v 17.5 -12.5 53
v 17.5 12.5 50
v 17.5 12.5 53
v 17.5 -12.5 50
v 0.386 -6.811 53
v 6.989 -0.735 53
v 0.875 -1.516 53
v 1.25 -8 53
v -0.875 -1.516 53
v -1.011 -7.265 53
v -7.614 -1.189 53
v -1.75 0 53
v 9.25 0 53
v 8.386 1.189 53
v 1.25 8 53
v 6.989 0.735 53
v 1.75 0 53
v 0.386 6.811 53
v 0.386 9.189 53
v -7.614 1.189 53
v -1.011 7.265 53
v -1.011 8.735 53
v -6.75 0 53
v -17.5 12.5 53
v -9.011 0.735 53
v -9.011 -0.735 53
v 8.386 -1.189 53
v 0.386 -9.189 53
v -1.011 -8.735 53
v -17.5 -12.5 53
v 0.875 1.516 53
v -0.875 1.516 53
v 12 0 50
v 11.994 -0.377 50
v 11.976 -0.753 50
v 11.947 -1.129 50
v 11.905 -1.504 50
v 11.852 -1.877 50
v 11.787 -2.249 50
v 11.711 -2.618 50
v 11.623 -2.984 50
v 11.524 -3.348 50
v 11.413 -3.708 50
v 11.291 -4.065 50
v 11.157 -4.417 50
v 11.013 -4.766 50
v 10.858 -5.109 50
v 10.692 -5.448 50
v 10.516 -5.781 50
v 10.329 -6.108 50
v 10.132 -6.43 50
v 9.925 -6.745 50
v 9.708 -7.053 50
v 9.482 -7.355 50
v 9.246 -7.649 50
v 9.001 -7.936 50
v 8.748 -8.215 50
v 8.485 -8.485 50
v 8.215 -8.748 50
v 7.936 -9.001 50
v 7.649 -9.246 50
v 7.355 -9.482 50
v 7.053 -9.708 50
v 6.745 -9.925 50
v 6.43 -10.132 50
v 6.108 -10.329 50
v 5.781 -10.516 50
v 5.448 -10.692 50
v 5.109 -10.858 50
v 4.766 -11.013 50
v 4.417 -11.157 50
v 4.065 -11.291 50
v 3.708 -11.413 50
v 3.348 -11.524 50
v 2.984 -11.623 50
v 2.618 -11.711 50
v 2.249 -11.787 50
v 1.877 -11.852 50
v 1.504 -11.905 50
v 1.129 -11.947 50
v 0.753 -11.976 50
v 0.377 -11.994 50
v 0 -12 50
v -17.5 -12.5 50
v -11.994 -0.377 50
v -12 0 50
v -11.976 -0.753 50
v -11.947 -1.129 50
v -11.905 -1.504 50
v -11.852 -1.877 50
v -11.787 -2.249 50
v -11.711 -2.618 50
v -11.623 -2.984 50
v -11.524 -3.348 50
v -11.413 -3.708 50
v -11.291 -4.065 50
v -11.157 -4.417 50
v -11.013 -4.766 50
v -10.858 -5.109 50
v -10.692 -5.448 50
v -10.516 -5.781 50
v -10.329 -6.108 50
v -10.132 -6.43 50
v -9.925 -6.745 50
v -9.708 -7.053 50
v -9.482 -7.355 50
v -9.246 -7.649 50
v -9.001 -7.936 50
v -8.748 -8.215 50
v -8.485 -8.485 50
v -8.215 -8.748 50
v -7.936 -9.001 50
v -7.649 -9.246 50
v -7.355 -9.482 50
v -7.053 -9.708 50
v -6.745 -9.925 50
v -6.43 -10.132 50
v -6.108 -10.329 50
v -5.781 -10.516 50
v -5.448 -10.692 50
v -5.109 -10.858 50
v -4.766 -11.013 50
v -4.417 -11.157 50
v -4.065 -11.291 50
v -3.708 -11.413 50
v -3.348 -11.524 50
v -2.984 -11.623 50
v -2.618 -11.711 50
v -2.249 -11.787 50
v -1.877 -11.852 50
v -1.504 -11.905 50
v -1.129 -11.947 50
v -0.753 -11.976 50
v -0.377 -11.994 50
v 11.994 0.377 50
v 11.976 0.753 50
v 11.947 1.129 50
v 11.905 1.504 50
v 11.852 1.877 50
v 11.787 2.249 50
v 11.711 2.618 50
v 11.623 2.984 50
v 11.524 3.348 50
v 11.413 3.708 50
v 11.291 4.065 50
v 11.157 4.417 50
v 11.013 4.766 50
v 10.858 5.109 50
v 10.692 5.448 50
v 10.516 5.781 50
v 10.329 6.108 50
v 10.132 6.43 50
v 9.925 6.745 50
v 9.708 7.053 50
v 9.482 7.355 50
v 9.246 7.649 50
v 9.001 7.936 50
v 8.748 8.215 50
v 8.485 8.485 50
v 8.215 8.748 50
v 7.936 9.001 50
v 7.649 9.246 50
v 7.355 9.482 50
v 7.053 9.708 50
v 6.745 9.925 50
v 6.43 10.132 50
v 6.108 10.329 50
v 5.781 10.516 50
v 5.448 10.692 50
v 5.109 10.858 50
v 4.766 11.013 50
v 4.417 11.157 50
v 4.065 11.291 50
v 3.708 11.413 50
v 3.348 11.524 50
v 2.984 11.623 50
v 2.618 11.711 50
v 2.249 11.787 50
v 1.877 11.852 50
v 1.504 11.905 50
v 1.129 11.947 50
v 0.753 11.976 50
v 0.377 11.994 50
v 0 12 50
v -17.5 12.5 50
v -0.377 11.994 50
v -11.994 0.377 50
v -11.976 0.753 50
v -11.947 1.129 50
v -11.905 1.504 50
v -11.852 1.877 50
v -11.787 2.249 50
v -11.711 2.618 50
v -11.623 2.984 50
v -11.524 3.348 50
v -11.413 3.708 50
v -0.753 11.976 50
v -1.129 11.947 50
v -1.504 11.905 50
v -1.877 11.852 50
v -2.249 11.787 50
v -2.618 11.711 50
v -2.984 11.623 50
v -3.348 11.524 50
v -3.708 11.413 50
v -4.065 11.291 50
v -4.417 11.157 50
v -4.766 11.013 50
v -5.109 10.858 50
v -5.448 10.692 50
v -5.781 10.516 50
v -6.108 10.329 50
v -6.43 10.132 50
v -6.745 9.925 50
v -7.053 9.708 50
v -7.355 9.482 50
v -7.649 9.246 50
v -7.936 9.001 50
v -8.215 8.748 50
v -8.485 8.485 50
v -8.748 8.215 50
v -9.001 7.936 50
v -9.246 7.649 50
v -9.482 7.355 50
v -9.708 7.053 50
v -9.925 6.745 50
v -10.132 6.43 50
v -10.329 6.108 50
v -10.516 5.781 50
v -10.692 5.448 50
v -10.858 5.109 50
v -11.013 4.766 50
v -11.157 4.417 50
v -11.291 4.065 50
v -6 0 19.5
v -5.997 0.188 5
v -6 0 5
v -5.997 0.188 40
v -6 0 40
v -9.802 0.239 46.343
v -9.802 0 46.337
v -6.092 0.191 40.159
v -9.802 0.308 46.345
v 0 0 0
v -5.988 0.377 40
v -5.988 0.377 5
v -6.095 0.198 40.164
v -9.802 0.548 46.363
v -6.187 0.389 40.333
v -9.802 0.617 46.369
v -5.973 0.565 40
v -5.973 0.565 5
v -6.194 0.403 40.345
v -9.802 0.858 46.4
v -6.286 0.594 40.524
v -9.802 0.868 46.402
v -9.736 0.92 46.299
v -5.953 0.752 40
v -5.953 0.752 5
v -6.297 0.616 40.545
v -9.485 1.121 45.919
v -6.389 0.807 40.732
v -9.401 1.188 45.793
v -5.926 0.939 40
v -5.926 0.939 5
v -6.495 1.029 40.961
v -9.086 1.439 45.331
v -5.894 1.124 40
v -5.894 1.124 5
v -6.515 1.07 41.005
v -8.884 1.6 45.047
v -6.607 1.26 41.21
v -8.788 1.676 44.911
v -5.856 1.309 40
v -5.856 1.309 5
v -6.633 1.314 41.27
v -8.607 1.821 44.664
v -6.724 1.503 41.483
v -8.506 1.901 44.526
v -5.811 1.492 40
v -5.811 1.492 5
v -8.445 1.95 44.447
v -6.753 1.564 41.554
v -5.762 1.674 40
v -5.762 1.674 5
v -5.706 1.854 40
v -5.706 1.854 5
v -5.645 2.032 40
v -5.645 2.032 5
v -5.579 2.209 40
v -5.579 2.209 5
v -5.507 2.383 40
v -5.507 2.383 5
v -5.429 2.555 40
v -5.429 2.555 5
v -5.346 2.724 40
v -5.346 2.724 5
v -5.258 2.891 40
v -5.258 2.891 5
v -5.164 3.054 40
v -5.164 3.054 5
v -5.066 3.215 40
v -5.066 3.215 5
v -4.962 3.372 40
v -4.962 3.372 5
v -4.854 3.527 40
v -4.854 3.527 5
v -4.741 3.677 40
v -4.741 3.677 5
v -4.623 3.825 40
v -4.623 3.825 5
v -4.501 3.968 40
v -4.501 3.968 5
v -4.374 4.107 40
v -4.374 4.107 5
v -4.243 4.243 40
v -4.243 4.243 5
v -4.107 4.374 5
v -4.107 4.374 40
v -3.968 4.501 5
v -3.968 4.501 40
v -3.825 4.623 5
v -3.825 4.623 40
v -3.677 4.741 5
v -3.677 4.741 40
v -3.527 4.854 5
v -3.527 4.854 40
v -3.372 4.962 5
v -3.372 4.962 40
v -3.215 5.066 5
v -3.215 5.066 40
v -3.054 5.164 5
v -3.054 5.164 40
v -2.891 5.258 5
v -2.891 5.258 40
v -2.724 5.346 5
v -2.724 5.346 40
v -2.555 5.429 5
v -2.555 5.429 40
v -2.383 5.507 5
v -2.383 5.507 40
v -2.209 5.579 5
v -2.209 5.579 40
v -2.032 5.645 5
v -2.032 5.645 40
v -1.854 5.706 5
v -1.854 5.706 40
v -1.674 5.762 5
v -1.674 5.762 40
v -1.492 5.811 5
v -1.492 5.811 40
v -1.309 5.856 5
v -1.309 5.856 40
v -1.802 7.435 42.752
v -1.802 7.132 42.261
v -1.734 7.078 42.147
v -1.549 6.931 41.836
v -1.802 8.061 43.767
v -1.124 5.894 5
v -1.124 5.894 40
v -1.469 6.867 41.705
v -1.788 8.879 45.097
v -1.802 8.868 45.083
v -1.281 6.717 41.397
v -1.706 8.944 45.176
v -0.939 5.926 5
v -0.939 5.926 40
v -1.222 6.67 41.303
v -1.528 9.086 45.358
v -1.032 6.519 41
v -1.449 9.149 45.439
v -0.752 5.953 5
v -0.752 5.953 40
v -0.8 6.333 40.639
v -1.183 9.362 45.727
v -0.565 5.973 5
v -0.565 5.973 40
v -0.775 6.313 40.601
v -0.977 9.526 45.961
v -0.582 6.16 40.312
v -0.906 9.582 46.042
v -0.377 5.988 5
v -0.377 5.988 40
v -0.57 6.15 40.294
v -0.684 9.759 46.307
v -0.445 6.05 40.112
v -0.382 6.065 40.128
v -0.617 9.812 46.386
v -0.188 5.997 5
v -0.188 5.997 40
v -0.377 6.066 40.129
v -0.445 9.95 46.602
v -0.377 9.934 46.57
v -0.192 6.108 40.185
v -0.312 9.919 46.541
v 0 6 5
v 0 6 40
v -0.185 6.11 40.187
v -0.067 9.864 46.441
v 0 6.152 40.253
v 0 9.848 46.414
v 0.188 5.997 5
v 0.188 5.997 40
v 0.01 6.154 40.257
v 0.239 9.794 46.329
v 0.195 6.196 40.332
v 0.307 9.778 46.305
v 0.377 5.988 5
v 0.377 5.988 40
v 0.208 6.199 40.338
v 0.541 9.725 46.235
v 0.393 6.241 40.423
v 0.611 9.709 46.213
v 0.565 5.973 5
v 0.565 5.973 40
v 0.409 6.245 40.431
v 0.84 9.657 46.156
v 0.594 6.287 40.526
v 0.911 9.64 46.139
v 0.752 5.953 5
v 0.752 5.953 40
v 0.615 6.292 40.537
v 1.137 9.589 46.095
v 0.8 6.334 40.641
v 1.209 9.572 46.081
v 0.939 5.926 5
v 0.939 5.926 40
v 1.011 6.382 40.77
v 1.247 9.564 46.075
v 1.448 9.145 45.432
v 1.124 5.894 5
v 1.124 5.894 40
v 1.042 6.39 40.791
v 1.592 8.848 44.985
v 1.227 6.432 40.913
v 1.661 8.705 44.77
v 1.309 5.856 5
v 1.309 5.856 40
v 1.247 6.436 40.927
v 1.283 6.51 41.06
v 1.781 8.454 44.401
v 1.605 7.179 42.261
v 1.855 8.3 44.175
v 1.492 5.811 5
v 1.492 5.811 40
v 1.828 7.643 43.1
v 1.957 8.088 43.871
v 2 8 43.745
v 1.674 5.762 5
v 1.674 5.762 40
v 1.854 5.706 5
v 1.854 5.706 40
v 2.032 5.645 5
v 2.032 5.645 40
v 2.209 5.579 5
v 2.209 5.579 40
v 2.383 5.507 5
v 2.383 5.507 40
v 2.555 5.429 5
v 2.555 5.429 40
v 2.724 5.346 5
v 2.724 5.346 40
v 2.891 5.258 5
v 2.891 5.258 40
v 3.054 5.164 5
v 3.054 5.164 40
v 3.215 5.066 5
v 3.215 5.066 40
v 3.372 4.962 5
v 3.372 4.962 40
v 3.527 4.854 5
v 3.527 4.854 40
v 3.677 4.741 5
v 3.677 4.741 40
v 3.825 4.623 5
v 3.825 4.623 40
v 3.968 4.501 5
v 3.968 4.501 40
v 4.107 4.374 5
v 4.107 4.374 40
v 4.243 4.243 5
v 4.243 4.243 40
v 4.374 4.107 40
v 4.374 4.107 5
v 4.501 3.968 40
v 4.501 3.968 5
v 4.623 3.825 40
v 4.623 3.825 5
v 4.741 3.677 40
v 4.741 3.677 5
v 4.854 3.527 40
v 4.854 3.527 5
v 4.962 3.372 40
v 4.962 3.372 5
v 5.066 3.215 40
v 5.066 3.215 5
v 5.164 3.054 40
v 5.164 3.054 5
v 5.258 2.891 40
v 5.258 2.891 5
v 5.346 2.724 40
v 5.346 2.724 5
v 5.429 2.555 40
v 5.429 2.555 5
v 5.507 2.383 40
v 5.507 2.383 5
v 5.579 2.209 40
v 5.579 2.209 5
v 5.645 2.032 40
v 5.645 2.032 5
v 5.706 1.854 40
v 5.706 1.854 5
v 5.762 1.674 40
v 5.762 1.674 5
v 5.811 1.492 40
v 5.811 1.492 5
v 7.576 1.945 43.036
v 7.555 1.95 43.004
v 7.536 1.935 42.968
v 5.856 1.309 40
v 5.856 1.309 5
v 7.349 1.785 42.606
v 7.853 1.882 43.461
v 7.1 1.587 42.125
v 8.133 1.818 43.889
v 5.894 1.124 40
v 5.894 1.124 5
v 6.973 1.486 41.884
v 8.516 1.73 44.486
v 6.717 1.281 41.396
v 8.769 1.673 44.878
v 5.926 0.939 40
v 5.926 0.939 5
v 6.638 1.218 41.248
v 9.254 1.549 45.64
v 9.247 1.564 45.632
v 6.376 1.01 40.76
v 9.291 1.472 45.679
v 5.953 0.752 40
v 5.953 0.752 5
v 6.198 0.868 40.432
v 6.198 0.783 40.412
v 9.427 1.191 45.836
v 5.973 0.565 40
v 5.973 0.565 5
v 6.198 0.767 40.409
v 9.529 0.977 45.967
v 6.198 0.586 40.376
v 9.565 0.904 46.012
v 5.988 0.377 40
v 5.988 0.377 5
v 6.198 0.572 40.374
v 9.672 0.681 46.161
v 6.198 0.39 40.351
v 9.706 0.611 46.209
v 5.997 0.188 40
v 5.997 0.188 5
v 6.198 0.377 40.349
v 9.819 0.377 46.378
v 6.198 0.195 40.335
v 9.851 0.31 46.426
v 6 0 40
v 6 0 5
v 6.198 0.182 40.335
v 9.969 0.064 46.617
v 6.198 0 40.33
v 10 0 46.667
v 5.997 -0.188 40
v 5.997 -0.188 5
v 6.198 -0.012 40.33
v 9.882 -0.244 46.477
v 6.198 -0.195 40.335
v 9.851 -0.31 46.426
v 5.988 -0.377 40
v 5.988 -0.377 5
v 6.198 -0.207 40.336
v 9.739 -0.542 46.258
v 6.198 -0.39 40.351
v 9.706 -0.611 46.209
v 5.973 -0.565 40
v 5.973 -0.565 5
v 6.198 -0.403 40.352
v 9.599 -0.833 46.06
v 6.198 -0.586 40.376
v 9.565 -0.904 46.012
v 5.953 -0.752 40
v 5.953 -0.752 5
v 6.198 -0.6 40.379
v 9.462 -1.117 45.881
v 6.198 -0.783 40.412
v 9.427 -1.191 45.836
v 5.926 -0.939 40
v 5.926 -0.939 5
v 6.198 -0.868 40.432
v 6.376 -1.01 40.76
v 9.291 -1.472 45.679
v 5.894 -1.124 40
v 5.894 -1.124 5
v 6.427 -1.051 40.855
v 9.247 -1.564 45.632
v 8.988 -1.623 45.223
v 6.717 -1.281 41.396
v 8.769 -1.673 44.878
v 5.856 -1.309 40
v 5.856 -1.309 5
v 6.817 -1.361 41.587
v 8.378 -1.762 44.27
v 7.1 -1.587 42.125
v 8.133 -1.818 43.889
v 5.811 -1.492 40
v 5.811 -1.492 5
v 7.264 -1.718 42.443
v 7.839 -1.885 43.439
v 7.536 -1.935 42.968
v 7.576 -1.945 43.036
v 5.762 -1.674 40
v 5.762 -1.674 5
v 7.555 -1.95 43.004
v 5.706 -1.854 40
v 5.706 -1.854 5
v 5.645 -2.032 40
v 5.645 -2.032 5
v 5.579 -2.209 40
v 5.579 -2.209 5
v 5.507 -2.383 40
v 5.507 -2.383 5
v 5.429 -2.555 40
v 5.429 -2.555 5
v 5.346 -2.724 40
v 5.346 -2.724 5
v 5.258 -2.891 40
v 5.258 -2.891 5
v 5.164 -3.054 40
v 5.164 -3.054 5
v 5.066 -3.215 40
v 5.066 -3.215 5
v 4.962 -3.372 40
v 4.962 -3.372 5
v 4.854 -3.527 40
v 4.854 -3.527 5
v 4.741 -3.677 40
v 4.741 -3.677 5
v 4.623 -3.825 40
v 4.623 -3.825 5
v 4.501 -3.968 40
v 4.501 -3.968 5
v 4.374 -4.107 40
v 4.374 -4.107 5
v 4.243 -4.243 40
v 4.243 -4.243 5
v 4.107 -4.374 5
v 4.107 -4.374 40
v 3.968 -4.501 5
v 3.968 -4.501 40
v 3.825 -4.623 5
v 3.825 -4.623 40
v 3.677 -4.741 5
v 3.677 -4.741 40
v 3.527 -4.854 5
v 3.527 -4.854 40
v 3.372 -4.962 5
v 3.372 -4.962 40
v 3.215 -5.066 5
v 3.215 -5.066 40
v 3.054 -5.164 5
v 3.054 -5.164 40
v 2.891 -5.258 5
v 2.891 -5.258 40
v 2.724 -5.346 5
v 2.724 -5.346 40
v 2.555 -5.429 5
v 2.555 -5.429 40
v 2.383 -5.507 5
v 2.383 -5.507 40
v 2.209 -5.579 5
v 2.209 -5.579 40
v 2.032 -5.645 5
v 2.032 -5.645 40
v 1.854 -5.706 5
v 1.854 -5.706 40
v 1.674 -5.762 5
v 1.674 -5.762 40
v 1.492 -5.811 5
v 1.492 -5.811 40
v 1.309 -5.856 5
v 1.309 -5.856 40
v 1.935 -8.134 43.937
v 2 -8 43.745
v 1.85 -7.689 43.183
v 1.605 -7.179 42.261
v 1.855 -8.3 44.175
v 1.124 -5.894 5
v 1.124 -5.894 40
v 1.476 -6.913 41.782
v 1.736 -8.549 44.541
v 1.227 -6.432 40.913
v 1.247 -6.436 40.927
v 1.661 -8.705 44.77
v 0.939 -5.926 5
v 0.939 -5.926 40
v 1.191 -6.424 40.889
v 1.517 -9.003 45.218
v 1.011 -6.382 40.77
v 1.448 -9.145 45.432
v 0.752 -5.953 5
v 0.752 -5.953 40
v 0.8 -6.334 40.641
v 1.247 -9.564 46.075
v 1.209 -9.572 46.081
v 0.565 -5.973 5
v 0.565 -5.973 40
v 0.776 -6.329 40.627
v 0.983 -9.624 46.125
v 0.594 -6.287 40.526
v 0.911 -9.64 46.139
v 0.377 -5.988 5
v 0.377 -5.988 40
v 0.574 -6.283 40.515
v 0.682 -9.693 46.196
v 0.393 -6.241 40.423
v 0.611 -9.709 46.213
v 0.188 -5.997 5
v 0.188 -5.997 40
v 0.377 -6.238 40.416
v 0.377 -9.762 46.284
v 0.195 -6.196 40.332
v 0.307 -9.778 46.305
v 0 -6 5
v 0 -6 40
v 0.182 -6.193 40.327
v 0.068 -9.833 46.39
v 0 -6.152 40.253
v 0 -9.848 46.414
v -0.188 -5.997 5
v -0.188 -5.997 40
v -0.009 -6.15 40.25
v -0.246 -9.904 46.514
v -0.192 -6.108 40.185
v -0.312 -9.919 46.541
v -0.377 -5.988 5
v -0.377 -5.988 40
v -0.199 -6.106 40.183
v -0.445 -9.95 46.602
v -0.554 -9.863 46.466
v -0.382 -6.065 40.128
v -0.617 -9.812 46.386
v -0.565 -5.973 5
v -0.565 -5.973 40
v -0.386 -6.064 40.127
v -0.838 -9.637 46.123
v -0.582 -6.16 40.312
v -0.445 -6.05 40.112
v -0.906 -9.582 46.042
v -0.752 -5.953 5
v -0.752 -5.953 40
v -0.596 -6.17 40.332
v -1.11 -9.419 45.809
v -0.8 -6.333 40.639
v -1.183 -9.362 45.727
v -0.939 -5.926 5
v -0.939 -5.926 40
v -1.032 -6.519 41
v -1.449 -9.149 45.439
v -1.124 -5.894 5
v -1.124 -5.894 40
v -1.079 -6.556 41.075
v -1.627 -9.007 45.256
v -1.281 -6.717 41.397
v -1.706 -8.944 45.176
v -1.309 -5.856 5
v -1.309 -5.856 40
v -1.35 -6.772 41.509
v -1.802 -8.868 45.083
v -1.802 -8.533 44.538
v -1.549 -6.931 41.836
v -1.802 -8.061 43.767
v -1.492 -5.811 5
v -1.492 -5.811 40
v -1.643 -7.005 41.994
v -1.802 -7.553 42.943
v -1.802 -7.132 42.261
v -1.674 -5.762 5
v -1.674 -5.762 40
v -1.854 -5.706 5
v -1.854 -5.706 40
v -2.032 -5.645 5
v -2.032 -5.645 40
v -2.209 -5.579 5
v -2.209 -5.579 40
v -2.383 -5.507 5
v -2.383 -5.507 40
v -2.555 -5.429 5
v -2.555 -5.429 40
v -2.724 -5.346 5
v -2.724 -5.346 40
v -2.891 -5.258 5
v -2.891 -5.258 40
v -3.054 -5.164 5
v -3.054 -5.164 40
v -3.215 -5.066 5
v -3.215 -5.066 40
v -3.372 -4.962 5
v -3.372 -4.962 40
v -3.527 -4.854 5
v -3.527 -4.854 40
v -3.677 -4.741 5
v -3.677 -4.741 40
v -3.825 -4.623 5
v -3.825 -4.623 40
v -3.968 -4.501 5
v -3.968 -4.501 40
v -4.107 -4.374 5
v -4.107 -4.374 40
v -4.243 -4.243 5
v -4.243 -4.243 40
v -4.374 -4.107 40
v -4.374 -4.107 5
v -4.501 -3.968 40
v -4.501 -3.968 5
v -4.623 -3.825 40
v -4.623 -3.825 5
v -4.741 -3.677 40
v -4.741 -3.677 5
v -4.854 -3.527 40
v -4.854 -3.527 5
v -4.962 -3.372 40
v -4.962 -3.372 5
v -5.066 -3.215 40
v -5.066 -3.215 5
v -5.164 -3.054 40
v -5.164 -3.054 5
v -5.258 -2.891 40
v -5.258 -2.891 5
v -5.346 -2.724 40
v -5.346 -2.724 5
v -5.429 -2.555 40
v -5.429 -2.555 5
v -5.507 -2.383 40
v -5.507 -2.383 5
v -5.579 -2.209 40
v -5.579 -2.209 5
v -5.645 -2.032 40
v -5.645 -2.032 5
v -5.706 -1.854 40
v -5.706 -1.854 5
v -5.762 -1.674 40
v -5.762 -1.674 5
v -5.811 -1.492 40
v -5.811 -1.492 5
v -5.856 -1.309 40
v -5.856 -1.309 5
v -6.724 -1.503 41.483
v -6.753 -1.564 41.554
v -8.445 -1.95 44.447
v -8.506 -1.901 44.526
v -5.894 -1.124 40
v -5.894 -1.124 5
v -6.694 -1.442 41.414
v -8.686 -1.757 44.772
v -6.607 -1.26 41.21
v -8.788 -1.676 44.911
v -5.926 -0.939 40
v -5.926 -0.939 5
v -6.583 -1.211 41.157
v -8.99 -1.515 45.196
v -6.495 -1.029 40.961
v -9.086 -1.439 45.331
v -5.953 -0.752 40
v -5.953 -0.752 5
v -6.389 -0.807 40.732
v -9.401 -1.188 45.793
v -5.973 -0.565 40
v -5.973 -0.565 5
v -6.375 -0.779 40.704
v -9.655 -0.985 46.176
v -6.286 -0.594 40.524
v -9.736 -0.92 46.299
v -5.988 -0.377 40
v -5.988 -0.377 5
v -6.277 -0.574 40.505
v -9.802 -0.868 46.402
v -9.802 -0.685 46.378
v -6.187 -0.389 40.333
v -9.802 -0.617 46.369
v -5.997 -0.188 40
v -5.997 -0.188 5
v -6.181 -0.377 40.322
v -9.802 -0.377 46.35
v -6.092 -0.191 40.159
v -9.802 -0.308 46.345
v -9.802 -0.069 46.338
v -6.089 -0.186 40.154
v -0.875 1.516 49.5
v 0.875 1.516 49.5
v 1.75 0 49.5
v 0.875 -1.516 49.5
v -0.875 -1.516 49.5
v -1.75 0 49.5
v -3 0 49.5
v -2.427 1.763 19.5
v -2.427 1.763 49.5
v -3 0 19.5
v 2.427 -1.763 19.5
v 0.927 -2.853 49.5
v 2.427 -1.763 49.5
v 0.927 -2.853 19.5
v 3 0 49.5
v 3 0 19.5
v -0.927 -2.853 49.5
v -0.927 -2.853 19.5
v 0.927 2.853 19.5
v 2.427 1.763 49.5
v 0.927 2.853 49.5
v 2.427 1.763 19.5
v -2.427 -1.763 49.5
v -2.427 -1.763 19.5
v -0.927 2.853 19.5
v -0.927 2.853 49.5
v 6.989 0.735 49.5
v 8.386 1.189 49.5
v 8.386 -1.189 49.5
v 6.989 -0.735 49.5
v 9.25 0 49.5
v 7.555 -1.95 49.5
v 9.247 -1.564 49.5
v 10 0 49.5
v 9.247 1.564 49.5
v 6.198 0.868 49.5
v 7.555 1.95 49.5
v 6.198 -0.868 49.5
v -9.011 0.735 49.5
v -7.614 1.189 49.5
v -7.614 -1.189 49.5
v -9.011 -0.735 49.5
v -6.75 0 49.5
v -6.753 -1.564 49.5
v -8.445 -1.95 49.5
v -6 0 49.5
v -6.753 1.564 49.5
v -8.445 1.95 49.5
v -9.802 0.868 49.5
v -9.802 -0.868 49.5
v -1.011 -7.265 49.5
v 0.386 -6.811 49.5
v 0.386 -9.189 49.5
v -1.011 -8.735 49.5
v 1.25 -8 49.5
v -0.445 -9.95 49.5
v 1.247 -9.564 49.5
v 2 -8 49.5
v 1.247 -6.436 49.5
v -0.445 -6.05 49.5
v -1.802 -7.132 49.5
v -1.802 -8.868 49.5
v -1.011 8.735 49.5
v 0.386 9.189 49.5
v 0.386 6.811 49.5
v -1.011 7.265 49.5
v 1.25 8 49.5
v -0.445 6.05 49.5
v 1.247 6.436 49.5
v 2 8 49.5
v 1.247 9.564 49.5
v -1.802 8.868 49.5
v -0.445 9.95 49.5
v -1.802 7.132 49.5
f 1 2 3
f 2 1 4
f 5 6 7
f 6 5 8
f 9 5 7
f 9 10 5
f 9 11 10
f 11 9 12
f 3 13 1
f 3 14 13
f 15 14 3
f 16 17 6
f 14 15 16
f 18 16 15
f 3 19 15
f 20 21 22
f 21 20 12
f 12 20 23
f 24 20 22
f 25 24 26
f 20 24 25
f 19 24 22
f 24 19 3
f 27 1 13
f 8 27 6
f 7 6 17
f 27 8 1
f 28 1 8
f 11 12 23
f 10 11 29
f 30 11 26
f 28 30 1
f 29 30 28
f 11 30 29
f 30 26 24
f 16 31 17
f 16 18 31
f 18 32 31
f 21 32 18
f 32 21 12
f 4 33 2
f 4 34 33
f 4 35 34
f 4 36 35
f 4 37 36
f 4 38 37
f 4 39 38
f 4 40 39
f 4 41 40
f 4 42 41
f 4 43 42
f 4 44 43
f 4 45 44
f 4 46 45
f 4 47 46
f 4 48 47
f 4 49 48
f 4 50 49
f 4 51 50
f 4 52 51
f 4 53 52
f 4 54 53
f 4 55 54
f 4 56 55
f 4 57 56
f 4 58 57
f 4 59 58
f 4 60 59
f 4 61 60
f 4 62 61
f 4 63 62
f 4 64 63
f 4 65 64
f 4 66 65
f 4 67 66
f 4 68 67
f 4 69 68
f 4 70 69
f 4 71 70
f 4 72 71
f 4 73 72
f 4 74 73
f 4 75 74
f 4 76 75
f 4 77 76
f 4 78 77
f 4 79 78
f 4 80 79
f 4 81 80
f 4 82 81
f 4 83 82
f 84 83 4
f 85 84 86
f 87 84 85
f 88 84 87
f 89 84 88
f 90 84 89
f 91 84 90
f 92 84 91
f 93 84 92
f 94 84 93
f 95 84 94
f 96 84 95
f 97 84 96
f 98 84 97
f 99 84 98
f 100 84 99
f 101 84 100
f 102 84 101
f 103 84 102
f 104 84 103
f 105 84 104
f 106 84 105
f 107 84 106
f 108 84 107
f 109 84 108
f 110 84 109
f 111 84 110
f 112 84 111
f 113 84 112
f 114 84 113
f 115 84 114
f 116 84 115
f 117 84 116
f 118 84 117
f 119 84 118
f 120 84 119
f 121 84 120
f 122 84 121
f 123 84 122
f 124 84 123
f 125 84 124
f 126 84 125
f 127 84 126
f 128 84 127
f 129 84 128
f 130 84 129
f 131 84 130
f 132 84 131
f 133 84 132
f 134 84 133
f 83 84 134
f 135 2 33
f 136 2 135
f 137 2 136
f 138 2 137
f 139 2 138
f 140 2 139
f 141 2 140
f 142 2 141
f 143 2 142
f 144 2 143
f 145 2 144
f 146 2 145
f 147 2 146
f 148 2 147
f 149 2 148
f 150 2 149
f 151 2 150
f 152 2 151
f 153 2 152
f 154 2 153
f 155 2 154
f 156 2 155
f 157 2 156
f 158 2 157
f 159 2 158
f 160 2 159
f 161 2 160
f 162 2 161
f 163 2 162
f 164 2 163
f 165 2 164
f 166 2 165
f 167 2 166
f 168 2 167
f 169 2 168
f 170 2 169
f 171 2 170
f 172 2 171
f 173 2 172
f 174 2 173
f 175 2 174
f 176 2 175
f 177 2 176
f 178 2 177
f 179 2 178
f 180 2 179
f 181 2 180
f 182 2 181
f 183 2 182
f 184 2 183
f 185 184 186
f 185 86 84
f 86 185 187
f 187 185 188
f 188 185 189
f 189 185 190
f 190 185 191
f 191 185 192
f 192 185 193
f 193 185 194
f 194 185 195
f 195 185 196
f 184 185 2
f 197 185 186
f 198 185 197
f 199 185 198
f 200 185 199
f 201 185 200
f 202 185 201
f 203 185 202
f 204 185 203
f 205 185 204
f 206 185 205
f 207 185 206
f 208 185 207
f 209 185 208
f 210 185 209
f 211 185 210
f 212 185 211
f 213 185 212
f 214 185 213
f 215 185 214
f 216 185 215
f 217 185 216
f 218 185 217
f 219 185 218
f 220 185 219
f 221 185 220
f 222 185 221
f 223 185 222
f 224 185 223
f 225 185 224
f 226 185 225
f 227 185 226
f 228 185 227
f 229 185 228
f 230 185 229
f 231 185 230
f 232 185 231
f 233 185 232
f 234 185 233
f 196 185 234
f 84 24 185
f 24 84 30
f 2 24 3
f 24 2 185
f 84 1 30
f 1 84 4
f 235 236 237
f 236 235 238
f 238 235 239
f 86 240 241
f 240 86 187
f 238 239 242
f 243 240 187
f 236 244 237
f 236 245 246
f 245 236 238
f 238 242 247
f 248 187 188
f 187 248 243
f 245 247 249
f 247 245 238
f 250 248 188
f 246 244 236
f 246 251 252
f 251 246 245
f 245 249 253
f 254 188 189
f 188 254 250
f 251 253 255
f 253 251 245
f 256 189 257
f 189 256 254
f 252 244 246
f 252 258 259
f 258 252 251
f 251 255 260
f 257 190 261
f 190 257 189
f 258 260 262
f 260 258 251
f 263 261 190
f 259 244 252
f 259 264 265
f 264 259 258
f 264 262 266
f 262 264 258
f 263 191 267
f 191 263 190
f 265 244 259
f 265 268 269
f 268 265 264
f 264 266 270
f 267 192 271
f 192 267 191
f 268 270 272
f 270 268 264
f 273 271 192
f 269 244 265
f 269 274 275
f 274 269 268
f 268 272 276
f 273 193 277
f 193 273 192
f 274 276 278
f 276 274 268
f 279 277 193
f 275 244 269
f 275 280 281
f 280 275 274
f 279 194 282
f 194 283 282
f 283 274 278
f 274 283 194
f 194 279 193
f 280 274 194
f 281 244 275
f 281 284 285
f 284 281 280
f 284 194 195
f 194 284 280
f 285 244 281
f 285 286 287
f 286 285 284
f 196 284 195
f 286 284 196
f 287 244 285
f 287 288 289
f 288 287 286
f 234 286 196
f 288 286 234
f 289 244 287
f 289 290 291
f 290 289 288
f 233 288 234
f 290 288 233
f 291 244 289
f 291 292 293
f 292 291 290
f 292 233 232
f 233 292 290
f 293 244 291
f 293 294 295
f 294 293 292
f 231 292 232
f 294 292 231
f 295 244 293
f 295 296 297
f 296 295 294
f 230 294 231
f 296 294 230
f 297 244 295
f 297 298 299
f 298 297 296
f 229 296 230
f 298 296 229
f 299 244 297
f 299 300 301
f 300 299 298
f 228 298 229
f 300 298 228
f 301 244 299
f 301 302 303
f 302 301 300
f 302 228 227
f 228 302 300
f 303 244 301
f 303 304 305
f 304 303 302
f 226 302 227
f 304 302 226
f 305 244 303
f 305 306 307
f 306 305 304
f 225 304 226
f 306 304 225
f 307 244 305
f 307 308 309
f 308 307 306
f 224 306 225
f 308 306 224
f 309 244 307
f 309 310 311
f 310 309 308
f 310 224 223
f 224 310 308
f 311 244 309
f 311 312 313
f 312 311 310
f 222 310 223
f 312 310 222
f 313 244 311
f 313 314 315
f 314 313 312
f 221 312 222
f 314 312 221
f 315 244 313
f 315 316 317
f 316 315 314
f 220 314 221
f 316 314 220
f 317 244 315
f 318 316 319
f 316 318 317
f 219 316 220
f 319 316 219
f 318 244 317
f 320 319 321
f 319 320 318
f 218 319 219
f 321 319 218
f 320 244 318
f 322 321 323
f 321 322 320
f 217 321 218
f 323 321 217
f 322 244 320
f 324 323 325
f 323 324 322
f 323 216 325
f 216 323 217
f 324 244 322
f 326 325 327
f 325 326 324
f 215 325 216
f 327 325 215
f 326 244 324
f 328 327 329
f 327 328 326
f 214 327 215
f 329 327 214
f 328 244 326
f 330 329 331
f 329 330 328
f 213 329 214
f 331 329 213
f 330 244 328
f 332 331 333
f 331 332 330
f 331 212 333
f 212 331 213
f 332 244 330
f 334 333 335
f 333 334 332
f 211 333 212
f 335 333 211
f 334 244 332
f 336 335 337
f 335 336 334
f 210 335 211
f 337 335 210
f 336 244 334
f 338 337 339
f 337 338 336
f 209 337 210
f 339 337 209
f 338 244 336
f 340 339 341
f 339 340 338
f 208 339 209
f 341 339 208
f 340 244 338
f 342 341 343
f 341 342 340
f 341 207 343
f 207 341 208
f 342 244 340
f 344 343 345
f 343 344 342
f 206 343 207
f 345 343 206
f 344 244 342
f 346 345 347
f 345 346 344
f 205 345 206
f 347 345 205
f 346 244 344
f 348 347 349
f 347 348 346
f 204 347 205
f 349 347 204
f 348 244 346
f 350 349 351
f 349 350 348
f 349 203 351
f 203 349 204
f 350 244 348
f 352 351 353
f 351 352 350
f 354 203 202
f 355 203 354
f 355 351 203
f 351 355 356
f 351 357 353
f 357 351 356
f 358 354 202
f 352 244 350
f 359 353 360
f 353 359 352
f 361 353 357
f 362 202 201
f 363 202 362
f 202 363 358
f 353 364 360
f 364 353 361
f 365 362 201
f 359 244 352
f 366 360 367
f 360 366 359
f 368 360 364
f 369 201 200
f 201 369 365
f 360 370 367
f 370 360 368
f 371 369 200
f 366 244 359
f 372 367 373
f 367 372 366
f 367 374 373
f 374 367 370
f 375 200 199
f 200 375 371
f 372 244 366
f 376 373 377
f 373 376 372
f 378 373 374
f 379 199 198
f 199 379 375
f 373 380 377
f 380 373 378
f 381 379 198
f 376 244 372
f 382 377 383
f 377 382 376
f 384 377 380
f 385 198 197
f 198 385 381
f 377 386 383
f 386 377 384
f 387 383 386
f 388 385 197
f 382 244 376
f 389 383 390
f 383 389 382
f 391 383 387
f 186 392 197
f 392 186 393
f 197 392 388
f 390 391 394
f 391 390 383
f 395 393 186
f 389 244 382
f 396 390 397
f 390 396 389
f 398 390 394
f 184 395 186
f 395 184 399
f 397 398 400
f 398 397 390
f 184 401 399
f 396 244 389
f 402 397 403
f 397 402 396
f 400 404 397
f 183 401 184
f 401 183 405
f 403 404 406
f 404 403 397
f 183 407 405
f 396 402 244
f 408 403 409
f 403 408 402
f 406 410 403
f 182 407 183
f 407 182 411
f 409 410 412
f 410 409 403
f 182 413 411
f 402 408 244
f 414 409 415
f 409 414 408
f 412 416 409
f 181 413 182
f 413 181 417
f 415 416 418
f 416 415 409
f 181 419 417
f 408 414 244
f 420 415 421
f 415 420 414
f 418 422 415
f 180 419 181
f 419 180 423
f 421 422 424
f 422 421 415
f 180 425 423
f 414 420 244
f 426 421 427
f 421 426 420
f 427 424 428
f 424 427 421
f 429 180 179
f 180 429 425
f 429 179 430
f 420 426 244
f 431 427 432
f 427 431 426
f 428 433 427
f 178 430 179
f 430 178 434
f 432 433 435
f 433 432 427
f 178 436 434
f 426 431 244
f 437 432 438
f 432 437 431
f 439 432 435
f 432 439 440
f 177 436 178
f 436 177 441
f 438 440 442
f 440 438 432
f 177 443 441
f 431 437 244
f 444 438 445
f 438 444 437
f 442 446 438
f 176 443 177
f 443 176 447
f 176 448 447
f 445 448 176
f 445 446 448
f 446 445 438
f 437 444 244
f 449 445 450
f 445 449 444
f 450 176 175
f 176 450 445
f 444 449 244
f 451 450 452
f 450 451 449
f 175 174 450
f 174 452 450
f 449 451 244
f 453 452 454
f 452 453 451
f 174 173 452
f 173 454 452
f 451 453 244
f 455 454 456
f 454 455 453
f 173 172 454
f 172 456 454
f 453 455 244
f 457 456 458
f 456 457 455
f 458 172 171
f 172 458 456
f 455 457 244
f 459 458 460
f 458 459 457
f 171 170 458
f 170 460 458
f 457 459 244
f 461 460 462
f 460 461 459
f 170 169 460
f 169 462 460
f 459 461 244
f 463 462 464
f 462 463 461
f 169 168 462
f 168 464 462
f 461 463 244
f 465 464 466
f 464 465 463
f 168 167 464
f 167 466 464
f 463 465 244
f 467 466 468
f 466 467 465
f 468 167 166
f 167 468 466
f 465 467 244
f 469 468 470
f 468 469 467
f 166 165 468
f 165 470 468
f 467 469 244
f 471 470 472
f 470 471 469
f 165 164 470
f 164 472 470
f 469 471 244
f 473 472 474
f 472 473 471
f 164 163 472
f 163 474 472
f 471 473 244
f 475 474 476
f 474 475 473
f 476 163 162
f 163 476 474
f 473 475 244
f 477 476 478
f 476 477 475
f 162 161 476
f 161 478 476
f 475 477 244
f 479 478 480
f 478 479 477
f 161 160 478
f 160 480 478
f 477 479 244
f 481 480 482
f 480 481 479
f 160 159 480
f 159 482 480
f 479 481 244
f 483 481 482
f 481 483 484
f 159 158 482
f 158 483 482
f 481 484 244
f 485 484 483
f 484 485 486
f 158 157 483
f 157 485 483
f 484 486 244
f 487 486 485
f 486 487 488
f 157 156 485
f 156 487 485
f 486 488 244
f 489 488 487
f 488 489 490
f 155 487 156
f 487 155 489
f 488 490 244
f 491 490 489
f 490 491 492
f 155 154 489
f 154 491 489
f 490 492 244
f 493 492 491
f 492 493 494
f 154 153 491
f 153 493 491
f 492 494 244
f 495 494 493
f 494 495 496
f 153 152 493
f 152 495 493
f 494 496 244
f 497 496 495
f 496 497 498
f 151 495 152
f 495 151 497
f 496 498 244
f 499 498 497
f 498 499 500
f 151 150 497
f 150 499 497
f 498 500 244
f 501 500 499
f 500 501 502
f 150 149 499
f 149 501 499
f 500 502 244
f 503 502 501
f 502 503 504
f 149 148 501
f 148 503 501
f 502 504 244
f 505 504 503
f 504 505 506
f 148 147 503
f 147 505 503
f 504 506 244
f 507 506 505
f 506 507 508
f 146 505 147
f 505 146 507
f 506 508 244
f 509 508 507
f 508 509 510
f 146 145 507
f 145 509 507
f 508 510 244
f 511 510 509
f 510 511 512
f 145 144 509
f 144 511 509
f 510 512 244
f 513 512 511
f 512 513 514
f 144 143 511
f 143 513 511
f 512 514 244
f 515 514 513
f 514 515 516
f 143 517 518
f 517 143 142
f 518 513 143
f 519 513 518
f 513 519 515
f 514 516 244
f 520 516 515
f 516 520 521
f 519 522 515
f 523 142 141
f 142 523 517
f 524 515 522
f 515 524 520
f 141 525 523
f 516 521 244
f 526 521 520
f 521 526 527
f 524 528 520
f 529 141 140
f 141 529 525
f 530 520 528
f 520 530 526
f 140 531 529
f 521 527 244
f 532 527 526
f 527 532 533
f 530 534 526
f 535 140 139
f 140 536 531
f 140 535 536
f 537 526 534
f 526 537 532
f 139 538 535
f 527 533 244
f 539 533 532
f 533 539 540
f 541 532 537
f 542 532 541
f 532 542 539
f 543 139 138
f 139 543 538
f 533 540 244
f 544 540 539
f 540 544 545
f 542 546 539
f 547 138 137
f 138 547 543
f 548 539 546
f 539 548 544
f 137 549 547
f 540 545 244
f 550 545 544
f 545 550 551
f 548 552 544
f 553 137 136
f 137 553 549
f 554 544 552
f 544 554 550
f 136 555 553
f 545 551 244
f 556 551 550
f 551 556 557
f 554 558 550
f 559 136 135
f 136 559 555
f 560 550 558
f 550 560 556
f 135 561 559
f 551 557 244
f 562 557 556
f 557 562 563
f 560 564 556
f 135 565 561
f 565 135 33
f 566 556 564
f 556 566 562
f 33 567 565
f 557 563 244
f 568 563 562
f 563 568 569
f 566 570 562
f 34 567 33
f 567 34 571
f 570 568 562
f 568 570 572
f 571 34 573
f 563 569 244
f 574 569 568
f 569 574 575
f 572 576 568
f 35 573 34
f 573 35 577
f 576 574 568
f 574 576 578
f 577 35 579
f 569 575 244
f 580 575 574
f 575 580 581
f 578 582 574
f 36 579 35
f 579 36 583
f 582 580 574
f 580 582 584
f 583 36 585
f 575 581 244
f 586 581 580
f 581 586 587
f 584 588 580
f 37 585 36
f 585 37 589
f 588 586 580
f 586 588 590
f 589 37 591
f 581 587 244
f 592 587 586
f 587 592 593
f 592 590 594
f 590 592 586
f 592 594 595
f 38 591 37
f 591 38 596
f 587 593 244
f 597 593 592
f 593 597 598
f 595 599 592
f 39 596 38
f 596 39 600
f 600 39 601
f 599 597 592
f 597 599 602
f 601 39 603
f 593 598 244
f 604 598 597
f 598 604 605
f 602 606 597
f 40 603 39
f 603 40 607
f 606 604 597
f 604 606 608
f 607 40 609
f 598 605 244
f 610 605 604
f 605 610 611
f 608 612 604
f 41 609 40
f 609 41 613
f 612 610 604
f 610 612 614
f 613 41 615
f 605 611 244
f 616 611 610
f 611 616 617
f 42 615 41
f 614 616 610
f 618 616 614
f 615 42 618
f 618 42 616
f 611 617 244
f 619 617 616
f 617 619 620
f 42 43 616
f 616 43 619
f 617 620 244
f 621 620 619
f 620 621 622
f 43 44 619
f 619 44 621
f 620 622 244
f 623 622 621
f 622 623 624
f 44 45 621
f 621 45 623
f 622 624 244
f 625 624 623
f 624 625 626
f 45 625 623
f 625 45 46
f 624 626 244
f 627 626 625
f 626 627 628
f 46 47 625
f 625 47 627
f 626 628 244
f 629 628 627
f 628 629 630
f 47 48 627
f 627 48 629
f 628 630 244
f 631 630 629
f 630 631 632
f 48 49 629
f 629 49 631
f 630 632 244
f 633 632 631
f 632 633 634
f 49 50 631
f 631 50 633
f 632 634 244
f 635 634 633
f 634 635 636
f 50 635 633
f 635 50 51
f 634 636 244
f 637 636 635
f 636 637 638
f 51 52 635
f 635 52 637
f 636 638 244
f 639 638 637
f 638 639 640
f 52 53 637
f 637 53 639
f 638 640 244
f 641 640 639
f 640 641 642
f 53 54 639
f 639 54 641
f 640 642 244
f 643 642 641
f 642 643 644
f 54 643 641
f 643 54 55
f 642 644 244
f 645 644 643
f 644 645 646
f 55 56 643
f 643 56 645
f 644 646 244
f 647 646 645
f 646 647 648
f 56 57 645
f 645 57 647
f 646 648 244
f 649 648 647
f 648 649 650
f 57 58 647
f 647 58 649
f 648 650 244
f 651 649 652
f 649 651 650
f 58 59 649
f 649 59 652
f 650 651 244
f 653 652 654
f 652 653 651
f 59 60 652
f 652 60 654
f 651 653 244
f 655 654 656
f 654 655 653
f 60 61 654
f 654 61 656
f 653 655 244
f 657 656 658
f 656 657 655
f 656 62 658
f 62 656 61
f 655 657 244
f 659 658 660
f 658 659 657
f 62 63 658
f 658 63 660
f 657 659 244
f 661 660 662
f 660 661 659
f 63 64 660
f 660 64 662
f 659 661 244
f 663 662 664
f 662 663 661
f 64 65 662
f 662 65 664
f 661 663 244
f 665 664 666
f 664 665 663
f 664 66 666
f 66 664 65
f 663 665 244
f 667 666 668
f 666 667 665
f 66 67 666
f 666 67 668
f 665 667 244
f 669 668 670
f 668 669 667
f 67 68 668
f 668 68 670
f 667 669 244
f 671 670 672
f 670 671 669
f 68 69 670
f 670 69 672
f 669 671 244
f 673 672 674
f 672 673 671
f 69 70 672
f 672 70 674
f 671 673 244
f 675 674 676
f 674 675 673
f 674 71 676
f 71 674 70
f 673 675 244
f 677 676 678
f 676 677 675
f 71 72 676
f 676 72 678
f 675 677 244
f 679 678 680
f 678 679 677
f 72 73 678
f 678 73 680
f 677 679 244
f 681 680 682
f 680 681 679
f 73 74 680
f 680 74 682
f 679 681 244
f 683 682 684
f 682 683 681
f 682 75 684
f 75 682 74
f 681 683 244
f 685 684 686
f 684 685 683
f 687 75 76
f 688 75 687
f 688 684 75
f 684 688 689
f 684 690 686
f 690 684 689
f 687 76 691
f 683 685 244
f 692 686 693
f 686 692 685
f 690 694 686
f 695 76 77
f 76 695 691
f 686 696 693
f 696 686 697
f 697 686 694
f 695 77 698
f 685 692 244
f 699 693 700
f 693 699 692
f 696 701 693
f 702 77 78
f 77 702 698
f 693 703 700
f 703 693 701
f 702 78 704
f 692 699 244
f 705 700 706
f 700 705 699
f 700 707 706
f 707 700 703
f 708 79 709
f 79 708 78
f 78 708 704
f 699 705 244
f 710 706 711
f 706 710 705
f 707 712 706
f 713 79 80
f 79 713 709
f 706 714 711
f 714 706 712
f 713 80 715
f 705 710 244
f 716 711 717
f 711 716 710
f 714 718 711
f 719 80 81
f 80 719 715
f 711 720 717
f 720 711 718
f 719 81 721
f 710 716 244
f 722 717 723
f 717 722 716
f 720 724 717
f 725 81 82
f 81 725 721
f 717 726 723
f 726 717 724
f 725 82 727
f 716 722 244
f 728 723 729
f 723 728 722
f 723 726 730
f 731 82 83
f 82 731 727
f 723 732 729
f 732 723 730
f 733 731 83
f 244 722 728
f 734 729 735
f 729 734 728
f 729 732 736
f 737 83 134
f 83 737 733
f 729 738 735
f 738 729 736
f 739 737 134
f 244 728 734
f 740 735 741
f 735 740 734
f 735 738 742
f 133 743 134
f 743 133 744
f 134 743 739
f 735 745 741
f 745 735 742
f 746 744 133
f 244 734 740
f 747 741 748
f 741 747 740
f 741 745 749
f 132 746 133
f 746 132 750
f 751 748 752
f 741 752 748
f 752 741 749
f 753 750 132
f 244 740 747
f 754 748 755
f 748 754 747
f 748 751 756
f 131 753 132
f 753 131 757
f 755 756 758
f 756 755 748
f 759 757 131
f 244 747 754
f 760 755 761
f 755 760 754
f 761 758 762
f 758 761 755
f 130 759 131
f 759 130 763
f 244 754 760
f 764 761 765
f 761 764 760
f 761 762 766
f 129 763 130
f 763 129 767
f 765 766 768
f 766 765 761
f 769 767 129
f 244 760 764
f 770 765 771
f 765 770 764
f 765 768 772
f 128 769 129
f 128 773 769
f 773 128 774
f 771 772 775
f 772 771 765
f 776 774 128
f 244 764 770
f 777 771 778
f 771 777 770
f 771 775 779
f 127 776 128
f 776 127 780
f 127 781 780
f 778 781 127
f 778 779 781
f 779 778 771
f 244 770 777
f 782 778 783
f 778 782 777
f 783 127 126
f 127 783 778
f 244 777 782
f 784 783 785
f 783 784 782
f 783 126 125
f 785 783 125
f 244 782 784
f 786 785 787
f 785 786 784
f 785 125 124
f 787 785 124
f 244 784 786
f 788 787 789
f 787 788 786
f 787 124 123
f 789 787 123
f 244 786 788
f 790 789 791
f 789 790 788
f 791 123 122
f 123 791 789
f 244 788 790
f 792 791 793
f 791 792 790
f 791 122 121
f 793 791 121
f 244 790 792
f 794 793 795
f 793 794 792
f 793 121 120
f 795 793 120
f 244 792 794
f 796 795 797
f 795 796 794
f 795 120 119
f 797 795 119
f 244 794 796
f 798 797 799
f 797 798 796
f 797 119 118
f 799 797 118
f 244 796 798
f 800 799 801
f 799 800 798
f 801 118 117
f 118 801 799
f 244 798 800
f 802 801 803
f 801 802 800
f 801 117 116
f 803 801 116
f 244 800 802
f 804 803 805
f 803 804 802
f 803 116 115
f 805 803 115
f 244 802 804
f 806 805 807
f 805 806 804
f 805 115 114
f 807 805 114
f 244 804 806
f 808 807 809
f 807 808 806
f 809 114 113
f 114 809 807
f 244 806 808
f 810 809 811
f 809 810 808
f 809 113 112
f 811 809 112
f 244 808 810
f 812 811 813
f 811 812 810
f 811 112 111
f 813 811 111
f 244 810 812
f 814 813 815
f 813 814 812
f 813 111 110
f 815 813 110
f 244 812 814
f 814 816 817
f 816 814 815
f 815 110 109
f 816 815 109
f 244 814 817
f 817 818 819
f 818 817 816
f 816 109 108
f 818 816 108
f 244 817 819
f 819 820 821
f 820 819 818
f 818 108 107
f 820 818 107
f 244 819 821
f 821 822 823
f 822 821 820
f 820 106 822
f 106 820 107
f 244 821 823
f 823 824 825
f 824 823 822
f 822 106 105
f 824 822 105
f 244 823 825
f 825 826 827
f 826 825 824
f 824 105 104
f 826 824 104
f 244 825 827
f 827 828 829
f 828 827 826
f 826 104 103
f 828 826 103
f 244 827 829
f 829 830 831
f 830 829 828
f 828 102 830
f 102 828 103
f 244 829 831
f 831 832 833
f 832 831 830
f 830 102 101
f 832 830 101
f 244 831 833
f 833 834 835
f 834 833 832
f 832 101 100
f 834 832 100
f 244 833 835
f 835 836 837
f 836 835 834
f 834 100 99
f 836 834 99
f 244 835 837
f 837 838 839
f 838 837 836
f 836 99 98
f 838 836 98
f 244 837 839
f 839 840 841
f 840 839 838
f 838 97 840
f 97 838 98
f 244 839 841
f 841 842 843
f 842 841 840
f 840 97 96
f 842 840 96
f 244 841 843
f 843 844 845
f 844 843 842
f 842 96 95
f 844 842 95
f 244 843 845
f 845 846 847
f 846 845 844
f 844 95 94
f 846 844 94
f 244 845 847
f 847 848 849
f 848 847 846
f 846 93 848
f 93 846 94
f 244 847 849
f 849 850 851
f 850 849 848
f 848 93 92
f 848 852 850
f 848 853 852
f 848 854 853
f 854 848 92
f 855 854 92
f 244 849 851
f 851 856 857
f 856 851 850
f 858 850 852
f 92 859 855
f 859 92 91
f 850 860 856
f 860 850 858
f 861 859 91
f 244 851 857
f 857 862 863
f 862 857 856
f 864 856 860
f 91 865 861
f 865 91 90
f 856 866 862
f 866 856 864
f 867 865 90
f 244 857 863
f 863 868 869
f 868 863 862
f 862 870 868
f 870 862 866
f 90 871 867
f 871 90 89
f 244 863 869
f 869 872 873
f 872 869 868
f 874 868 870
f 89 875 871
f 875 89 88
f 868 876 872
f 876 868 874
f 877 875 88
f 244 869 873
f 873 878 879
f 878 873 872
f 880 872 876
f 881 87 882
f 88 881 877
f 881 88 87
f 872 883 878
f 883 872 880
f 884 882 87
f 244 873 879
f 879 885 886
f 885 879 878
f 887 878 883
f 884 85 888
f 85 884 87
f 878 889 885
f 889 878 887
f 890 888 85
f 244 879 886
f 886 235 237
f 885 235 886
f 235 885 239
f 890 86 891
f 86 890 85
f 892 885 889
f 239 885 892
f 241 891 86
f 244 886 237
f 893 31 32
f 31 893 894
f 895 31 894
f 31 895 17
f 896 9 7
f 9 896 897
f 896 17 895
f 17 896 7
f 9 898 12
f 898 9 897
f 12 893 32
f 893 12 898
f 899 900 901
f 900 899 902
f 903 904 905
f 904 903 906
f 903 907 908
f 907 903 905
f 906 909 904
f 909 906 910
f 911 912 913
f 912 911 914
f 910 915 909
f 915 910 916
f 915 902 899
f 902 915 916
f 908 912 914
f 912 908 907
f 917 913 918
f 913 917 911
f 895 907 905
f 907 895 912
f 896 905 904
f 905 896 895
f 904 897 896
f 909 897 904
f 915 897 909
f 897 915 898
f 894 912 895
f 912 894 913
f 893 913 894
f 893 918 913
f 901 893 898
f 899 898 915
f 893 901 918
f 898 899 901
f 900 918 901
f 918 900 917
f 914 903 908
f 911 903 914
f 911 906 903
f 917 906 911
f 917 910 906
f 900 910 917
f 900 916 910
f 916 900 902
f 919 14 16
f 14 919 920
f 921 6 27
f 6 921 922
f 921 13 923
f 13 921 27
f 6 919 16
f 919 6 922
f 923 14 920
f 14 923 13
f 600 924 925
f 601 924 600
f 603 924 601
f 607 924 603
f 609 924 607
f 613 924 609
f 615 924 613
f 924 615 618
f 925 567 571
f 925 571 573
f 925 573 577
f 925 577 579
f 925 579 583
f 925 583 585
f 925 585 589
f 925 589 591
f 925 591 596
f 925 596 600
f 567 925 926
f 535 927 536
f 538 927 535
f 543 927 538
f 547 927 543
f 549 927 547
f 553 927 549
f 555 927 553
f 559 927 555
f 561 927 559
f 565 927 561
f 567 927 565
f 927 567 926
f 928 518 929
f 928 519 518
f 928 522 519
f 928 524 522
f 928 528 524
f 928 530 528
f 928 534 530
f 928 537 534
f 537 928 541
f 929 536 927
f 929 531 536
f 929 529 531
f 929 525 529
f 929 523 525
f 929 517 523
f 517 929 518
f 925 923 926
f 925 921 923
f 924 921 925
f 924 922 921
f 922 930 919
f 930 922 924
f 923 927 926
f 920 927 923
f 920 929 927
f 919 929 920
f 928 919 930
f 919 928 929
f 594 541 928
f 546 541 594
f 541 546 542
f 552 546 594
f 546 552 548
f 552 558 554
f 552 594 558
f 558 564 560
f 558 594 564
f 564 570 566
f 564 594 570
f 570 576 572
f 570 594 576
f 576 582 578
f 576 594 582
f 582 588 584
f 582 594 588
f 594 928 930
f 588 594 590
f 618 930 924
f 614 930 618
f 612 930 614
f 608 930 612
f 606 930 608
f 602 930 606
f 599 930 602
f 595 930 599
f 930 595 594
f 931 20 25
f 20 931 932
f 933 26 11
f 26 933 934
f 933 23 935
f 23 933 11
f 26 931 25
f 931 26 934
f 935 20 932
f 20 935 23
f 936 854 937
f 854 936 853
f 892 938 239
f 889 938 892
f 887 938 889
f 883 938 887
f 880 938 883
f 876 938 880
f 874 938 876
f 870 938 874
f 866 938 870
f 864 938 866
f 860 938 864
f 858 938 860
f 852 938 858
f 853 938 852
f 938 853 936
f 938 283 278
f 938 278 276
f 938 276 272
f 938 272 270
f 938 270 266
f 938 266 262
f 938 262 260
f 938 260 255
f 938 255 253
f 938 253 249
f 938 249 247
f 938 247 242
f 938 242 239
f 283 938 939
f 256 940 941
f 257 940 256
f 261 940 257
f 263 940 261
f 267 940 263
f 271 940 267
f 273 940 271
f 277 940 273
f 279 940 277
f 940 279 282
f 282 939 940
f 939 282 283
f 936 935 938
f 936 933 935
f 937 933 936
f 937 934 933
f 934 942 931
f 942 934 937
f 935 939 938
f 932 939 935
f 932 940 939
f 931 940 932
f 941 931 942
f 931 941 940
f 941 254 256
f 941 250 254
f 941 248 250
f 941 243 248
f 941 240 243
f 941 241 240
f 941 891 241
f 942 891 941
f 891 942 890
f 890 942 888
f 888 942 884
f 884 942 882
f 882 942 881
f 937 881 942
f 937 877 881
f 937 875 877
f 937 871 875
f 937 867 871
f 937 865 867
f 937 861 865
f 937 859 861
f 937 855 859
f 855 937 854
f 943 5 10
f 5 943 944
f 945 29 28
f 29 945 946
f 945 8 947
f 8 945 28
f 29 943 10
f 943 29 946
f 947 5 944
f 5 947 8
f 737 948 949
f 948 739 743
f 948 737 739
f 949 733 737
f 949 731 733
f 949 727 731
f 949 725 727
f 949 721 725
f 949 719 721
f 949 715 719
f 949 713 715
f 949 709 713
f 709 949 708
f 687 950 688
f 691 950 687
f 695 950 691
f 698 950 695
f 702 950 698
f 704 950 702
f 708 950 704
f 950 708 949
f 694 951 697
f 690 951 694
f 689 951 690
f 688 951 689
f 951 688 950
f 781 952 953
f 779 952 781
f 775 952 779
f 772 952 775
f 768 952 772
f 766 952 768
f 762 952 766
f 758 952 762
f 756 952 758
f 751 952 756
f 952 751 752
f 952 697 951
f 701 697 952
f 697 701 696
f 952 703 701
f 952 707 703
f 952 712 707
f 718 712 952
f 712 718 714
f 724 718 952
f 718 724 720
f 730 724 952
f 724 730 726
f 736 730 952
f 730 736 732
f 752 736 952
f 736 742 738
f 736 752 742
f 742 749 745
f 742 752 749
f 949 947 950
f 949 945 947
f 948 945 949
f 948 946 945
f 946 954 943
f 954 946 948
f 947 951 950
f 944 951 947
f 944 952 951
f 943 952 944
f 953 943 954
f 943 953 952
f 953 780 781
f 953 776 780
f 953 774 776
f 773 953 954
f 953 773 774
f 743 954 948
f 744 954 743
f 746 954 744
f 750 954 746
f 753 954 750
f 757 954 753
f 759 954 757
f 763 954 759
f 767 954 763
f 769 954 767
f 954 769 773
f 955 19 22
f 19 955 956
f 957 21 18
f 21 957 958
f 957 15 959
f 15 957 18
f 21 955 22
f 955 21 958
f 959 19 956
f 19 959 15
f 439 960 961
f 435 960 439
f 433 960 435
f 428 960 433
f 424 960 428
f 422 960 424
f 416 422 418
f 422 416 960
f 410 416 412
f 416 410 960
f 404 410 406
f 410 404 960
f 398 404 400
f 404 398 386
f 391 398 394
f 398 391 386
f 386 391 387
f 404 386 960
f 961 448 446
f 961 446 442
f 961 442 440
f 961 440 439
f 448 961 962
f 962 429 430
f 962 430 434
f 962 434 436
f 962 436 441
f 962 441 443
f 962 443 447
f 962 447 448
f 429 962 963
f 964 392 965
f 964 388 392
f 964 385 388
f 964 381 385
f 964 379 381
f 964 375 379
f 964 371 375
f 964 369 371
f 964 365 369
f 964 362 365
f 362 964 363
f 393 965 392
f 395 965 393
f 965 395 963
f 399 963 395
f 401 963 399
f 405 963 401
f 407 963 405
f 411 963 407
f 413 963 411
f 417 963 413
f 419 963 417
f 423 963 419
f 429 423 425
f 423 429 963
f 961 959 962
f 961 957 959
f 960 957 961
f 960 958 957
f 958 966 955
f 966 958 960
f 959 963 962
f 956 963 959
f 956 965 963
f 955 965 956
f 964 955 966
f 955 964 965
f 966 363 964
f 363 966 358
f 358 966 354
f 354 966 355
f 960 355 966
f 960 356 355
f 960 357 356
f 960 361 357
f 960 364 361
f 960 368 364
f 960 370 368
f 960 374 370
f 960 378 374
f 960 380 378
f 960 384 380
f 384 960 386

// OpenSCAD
// file: ../misc.scad
// Simple primatives for generating holes

module hex(side,t){
    s = side/2;
    h = sqrt(side*side-s*s);
    pts = [
        [2*s,0],
        [s,h],
        [-s,h],
        [-2*s,0],
        [-s,-h],
        [s,-h]
    ];
    linear_extrude(height=t){
        polygon(pts);
    }
}


module M3(t){
    dia = 3.5;
    sdia = 6;
    cylinder(3*t, d=dia, center=true);  // M2
    translate([0,0,2]) cylinder(3*t, d=sdia, center=false);  // screw driver
}

module M2(t){
    dia = 2.5;
    sdia = 4;
    cylinder(3*t, d=dia, center=true);  // M2
    translate([0,0,2]) cylinder(3*t, d=sdia, center=false);  // screw driver
}


/* module holes(t){
    // M3 3.3 mm
    M3(t);

    // M2 2.3 mm
    // dia = 2.3;
    translate([8,0,0]) M2(t);
    translate([-8,0,0]) M2(t);
    translate([0,8,0]) M2(t);
    translate([0,-8,0]) M2(t);
}

module pulley(dia=24, thick=3, cen=false){
    cylinder(thick,d=dia,center=cen);
} */
// file: ../robotis_parts.scad
use <misc.scad>;

///////////////////////
// These are STL models I found on line
///////////////////////

module ax12(){
    // sort of center mass
    color("gray") translate([-70,-210,-180]) import("parts/AX-12A.STL");
}


module f2(){
    // U bracket
    // sort of center mass
    color("lightgray") translate([0,0,0]) import("parts/F2.stl");
}

module f3(){
    // End cap bracket
    // sort of center mass
    color("lightgray") translate([0,0,0]) import("parts/F3.stl");
}

/////////////////////
// These are some interfaces I made for the parts
////////////////////

module pulleyHole(){
    cylinder(20, d=8.5, center=true);  // hub
    translate([0,0,3]) cylinder(20, d=11);  // 3mm?
}

module holes(t){
    // M3 3.3 mm
    M3(t);

    // M2 2.3 mm
    /* dia = 2.3; */
    translate([8,0,0]) M2(t);
    translate([-8,0,0]) M2(t);
    translate([0,8,0]) M2(t);
    translate([0,-8,0]) M2(t);
}

// does anything use this?????
/* module pulley(dia=24, thick=3, cen=false){
    cylinder(thick,d=dia,center=cen);
} */

module servo_mnt(){
    d = 2.5;
    w = 22; // center servo
    l = 35; // center servo
    s = 38.5-2.5;
    h=20;

    translate([32,-20,-1]) cube([20,40,h],center=false);
    translate([2.5,-w/2,-1])cube([l,w,h],center=false);

    // bottom holes
    translate([0,8,-1]) cylinder(h,d=d);
    translate([0,-8,-1]) cylinder(h,d=d);

    // right holes
    translate([5.5,-27/2,-1]) cylinder(h,d=d);
    translate([5.5+8,-27/2,-1]) cylinder(h,d=d);
    translate([5.5+16,-27/2,-1]) cylinder(h,d=d);
    translate([5.5+24,-27/2,-1]) cylinder(h,d=d);

    // left holes
    translate([5.5,27/2,-1]) cylinder(h,d=d);
    translate([5.5+8,27/2,-1]) cylinder(h,d=d);
    translate([5.5+16,27/2,-1]) cylinder(h,d=d);
    translate([5.5+24,27/2,-1]) cylinder(h,d=d);
}
// main file
use <../robotis_parts.scad>;

//////////////////////////////////////////////////////
// Tarsus
//////////////////////////////////////////////////////
module tarsus(){
    color("SkyBlue") difference(){
        union(){
            translate([0,0,50+3/2]) cube([35,25,3], center=true);
            // [x,y]
            // x = width
            // y = height
            /* points=[[0,0],[4,0],[4,1],[2,2],[2,8],[4,10],[0,10]]; // flat head */
            points=[[0,0],[1,1],[1,8],[2,10],[0,10]]; // thumb tack / screw
            rotate([0,0,0]) translate([0,0,0]) scale([6,6,5]) rotate_extrude($fn=200) polygon(points);
        }
        translate([0,0,50+3/2]) rotate([180,0,0]) holes(10);
    }
}

tarsus();
